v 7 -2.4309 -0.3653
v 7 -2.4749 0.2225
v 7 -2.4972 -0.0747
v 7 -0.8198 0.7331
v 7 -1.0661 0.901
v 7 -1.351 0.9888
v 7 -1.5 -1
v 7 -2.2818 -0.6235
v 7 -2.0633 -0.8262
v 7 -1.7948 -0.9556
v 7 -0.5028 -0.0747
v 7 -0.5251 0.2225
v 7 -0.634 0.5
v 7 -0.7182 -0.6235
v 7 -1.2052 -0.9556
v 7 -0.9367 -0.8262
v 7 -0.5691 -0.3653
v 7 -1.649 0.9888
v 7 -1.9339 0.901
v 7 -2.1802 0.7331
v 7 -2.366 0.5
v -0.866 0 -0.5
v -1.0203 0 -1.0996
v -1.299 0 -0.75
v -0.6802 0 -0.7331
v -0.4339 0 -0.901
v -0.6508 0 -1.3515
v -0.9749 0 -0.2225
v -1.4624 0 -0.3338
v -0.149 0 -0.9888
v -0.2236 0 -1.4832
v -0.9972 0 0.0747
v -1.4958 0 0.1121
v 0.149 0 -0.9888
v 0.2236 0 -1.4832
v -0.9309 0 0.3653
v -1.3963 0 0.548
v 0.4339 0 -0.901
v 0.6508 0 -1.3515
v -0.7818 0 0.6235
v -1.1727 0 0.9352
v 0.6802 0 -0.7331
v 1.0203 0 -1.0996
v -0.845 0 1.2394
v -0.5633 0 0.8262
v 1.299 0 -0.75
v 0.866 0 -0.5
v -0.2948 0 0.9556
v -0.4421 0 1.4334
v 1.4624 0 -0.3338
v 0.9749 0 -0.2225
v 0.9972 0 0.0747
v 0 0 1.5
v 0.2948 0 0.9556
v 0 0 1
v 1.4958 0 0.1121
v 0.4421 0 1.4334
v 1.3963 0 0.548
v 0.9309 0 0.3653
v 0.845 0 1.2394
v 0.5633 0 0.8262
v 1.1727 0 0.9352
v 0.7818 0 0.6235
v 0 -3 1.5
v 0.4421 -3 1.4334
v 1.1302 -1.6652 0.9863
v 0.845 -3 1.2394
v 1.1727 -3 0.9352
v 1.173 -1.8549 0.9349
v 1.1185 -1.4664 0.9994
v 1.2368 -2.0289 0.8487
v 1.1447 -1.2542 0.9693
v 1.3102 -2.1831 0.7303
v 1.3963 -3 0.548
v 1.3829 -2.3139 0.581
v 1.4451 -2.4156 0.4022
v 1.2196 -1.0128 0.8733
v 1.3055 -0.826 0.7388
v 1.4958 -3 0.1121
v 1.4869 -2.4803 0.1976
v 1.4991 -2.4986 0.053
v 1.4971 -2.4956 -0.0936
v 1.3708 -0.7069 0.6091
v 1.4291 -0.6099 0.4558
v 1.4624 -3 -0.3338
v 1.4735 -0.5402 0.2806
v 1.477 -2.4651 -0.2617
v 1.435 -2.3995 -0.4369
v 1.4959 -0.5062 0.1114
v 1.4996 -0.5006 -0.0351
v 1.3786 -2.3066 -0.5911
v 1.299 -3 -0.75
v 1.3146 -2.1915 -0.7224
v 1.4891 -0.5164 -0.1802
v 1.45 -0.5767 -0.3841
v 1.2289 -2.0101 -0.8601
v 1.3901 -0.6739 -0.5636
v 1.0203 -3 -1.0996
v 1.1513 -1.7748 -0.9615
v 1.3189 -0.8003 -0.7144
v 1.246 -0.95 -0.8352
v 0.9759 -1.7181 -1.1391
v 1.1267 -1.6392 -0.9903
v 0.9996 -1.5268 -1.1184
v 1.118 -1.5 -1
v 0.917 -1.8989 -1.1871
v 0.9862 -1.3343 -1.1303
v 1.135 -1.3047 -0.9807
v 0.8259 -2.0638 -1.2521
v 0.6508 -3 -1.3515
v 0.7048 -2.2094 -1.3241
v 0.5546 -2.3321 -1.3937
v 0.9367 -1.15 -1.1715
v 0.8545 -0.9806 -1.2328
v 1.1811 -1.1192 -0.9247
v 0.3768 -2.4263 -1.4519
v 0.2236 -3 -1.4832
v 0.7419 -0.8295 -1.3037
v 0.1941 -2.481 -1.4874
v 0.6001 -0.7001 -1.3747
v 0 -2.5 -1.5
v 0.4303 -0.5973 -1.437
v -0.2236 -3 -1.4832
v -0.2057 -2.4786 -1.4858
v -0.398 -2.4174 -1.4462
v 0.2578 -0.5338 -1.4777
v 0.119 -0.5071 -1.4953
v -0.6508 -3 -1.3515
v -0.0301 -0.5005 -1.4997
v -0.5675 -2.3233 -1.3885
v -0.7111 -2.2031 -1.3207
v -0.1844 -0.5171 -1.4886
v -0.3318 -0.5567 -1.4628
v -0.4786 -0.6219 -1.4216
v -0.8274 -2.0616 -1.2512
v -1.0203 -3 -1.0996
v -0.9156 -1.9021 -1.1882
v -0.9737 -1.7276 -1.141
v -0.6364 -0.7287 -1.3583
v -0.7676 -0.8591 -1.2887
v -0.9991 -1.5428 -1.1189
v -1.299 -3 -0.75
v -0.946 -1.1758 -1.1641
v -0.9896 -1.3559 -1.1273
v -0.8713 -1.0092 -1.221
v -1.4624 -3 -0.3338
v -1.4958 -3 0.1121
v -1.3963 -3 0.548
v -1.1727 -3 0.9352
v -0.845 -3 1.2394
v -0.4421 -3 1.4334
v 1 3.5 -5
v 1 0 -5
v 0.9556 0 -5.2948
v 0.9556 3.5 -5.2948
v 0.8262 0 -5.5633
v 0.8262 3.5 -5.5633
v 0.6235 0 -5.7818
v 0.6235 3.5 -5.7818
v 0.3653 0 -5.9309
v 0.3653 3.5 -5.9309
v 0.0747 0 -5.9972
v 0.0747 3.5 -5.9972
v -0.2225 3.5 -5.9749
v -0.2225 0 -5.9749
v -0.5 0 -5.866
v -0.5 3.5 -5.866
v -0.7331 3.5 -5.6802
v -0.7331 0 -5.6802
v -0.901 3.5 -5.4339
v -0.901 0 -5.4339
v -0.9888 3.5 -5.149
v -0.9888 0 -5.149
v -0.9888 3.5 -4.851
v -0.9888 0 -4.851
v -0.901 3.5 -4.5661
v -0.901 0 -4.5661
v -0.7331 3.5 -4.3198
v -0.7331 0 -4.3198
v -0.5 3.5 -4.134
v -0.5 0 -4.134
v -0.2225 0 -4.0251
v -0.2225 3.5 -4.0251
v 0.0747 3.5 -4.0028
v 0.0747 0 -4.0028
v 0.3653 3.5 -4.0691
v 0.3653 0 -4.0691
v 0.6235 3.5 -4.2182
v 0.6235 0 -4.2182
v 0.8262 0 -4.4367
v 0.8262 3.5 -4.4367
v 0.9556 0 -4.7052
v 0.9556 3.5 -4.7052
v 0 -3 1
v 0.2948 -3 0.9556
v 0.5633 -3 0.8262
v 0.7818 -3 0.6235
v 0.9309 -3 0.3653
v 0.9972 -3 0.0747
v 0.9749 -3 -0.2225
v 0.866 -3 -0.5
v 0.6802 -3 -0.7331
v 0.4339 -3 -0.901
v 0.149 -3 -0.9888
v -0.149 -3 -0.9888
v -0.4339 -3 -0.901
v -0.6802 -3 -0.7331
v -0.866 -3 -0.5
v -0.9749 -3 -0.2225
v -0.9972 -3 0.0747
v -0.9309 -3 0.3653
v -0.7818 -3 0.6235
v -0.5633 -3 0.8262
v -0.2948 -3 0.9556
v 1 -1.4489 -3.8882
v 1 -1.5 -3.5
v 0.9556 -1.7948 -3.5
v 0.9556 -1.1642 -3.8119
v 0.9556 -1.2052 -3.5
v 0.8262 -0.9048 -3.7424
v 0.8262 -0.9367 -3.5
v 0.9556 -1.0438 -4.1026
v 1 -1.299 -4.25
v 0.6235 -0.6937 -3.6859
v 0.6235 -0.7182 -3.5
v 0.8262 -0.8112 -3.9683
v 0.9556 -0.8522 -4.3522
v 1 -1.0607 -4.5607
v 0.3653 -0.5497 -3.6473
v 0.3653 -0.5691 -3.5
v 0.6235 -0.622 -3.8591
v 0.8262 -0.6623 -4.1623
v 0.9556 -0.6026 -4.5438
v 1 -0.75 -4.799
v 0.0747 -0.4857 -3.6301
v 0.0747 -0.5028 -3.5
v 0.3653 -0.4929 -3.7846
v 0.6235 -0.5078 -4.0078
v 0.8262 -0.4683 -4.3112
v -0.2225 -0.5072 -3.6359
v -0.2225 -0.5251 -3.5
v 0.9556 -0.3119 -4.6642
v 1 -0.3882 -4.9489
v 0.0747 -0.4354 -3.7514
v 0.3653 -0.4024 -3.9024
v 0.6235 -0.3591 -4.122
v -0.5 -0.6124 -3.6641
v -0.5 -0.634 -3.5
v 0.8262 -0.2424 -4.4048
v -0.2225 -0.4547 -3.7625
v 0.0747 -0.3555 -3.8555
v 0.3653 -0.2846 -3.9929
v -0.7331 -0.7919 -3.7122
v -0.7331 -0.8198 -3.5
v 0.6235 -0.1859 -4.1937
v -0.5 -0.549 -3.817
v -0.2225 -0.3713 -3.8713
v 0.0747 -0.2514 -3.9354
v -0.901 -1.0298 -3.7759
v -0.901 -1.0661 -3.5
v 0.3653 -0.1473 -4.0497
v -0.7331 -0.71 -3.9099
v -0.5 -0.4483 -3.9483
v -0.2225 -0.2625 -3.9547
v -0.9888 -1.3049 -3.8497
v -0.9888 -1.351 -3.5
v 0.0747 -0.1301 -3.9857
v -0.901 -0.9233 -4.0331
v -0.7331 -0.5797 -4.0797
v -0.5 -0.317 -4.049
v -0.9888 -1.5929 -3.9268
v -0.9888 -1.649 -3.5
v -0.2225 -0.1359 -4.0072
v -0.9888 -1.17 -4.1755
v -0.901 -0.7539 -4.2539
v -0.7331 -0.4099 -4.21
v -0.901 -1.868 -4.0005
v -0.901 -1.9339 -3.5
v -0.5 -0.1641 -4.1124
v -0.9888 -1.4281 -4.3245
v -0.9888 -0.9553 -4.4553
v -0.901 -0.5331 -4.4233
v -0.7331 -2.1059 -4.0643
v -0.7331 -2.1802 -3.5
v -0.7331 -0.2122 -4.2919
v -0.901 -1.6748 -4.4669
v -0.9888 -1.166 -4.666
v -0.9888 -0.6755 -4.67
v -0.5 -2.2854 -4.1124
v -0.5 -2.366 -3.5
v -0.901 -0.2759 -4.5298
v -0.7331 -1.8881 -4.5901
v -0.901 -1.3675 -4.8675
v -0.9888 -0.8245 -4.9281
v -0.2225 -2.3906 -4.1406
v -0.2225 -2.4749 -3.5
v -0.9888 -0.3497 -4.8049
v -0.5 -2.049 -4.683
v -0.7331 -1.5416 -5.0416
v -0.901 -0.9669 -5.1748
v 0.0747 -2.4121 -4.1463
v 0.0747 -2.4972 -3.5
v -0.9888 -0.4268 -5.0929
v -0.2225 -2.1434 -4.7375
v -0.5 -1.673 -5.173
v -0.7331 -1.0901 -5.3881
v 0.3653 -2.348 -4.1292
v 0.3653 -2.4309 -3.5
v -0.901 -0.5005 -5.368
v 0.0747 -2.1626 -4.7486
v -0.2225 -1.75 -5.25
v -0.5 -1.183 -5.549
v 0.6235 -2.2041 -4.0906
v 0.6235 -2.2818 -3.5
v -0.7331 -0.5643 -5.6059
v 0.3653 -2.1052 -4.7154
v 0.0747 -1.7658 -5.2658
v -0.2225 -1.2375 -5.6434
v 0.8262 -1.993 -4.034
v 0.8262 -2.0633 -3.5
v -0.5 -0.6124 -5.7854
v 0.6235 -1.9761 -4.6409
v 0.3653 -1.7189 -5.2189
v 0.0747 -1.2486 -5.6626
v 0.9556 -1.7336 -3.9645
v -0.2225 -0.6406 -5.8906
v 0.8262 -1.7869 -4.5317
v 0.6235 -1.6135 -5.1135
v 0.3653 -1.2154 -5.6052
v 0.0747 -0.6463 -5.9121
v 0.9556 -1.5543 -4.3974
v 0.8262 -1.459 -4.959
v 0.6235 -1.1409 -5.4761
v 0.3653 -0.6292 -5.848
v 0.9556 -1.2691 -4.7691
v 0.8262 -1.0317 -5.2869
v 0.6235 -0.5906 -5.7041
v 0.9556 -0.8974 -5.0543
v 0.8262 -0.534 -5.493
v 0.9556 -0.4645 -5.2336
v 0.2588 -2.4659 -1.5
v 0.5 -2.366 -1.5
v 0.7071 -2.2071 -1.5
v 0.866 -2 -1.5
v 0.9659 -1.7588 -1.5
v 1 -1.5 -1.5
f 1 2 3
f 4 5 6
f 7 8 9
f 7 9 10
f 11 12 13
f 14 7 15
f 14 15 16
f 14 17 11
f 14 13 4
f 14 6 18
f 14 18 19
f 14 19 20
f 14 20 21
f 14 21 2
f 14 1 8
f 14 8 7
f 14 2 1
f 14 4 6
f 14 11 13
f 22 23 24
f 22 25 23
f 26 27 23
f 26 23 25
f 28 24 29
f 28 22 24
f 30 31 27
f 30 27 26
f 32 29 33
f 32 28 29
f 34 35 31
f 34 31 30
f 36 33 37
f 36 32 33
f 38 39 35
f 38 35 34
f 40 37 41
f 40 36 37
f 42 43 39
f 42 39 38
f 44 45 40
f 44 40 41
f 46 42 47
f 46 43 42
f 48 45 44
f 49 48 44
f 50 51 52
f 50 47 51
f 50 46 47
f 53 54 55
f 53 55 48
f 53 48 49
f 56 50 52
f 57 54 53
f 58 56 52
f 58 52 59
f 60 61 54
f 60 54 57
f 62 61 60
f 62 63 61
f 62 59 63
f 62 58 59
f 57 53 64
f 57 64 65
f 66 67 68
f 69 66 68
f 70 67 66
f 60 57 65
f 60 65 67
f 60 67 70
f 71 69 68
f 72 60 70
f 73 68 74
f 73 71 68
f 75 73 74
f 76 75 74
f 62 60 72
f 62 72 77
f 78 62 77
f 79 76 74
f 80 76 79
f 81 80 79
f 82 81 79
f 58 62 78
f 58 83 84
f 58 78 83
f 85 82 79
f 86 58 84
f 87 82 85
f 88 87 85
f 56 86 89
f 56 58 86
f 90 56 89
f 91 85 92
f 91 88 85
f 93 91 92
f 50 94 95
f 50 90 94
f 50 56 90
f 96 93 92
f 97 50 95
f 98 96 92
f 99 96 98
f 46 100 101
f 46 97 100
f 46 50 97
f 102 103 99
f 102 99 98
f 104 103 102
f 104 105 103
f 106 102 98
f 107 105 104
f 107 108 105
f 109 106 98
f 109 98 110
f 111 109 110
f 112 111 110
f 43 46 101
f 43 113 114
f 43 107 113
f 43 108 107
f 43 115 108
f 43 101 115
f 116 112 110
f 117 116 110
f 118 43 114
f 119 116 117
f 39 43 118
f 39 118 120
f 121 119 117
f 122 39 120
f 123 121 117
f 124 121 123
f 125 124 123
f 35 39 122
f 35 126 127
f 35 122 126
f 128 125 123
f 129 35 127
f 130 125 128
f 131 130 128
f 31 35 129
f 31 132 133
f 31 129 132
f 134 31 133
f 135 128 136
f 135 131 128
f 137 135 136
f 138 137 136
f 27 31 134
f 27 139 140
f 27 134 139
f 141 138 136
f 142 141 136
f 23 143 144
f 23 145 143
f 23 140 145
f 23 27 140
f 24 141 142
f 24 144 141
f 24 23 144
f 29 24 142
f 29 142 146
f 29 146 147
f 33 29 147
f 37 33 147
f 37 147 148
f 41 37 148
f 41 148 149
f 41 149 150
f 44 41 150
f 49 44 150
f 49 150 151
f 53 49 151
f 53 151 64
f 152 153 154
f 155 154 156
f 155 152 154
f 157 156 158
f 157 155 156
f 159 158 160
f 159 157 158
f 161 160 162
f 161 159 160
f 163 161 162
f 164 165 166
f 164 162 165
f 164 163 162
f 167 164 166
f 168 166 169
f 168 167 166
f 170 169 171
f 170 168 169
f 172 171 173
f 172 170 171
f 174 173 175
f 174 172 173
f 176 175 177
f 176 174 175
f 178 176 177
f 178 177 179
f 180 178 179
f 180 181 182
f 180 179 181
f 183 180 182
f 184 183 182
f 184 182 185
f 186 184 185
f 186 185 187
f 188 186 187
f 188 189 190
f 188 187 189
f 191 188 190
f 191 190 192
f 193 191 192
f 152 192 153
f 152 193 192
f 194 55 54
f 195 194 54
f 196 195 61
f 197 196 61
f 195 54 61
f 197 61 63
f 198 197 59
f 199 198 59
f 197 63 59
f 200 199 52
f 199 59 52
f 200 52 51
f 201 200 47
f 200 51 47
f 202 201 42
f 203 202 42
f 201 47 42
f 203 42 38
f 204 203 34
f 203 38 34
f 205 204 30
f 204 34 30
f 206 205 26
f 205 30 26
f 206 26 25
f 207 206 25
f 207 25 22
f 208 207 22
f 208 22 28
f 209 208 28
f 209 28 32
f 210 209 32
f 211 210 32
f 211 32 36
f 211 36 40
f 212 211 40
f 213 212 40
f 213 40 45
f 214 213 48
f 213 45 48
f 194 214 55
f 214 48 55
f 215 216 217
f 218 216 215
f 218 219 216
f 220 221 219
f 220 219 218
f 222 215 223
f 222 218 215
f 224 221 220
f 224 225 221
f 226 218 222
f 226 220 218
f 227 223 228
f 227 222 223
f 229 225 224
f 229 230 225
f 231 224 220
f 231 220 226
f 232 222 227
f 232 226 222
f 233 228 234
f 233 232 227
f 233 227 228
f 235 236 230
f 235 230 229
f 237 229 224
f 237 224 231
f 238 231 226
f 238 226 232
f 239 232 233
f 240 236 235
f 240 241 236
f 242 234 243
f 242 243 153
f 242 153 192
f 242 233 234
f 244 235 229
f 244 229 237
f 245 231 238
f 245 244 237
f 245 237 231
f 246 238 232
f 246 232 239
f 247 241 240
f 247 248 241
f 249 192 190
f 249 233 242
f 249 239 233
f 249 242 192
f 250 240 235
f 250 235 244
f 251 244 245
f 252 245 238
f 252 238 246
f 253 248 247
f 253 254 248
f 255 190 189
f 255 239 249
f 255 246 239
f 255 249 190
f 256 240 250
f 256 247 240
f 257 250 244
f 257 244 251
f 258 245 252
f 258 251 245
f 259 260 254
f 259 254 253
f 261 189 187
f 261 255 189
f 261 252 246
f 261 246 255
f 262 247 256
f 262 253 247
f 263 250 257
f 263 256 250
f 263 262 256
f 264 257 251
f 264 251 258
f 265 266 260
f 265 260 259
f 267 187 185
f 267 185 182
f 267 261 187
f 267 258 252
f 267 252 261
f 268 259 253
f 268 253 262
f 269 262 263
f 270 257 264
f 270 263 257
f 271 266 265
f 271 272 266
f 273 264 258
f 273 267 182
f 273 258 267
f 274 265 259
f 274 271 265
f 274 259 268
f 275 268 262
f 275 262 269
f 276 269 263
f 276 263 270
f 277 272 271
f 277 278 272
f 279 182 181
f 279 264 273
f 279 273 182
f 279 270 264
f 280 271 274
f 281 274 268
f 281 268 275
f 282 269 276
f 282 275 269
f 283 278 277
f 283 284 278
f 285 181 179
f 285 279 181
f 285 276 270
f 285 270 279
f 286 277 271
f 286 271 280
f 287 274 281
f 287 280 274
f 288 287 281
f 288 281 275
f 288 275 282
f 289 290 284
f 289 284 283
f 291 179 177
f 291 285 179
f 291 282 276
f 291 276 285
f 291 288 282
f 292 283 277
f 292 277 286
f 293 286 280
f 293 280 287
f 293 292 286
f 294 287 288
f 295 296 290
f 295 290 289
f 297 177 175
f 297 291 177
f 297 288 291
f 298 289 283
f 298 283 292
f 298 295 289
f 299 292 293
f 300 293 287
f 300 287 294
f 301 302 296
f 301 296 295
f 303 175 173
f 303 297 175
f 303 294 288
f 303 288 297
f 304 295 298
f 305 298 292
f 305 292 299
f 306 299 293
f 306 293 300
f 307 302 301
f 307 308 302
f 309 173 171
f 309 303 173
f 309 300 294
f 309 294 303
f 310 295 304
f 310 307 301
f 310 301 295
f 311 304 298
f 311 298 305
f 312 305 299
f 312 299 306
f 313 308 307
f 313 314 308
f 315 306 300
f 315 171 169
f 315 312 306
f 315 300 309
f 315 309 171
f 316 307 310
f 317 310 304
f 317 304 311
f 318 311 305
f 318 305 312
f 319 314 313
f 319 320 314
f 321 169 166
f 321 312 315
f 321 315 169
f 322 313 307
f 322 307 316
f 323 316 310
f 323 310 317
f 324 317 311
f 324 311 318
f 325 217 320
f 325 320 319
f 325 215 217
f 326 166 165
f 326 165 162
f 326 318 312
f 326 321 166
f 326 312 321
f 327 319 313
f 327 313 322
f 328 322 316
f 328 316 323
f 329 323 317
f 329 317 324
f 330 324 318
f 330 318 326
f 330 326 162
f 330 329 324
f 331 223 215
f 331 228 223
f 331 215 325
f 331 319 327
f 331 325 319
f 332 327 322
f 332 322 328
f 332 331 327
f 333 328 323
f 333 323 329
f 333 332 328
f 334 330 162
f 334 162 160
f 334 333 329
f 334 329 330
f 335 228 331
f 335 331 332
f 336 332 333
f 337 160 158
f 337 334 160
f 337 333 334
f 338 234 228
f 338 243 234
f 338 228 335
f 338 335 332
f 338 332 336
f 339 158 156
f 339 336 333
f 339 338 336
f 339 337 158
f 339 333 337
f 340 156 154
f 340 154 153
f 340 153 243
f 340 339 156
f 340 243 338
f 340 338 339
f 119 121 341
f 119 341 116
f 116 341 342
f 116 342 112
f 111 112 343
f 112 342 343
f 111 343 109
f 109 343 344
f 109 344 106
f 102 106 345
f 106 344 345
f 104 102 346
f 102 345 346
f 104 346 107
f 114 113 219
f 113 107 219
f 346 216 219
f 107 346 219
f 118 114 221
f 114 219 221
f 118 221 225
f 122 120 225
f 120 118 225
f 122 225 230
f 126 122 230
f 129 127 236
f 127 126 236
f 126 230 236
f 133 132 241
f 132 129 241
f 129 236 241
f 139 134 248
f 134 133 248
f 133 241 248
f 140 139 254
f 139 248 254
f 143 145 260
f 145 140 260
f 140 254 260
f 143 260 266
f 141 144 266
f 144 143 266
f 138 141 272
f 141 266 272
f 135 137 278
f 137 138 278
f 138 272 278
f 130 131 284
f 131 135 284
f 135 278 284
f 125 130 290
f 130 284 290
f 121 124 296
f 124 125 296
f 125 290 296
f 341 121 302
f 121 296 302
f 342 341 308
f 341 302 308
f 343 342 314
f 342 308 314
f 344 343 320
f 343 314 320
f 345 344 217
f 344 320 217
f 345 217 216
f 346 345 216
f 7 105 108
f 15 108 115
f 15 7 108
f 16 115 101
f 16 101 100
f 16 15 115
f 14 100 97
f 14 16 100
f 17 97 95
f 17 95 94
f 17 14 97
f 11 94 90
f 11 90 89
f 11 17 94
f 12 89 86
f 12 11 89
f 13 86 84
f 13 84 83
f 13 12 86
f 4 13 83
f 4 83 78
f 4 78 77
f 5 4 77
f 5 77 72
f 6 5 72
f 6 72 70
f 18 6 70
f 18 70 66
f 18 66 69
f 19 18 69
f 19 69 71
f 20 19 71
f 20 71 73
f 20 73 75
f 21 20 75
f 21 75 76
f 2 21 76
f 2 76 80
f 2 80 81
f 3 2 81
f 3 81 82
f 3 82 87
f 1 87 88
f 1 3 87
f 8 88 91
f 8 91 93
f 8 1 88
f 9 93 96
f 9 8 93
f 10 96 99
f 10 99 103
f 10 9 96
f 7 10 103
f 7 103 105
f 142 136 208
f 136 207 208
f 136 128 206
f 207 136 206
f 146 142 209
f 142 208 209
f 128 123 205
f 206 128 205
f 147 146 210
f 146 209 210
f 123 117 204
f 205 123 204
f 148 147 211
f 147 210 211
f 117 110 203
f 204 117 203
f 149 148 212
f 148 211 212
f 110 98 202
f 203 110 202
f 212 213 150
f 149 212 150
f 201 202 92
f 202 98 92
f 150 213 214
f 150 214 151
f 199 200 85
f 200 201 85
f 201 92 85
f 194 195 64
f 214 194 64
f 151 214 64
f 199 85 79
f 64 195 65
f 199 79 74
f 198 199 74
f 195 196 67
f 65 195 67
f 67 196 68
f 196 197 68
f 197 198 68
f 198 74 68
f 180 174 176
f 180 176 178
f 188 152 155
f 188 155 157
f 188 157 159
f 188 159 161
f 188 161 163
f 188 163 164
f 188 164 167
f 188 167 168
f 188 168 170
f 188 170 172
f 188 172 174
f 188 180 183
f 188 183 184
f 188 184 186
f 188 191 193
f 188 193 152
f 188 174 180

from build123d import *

# Parameters (mm, degrees)
SKETCH1_R                = 1.5
SKETCH1_R_2              = 1
BOSS_EXTRUDE1_DEPTH      = 3
SKETCH3_R                = 1
BOSS_EXTRUDE4_REACH      = 7.895
SKETCH4_R                = 1
BOSS_EXTRUDE5_REACH      = 12.977
BOSS_EXTRUDE5_END_RADIUS = 1.5
SKETCH6_R                = 1


with BuildPart() as part:
    # Sketch1 → Boss-Extrude1 (new body)
    with BuildSketch(Plane(origin=(0, 0, 0), x_dir=(1, 0, 0), z_dir=(0, 1, 0))):
        with Locations(Location((0, 0, 0), (0, 0, 270))):
            Circle(SKETCH1_R)
        with Locations(Location((0, 0, 0), (0, 0, 270))):
            Circle(SKETCH1_R_2, mode=Mode.SUBTRACT)
    extrude(amount=-BOSS_EXTRUDE1_DEPTH)

    # Sketch4 → Boss-Extrude4 (add, up to next)
    with BuildSketch(Plane.XY.offset(-1.5), mode=Mode.PRIVATE) as boss_extrude4_sk1:
        with Locations(Location((0, -1.5, 0), (0, 0, 180))):
            Circle(SKETCH4_R)
    boss_extrude4_tool1 = extrude(boss_extrude4_sk1.sketch, amount=BOSS_EXTRUDE4_REACH, mode=Mode.PRIVATE) - part.part


with BuildPart() as body_2:
    # Sweep1: sweep along a path in Sketch2
    with BuildLine(Plane(origin=(0, 0, 0), x_dir=(0, 0, -1), z_dir=(1, 0, 0))) as sweep1_path:
        Line((1.5, -1.5), (3.5, -1.5))
        ThreePointArc((3.5, -1.5), (4.560660172, -1.060660172), (5, 0))
        Line((5, 0), (5, 3.5))
    # Sketch3 → Sweep1 (sweep)
    with BuildSketch(Plane(origin=(0, 3.5, 0), x_dir=(1, 0, 0), z_dir=(0, 1, 0))):
        with Locations((0, 5)):
            Circle(SKETCH3_R)
    sweep(path=sweep1_path.line)


with BuildPart() as part_1:
    add(part.part)

    add(body_2.part)  # Boss-Extrude4 merges body 2
    add(boss_extrude4_tool1.solids().sort_by_distance((0, -1.5, -1.5))[0])
    add(boss_extrude4_tool1.solids().sort_by_distance((0, -1.5, -1.5))[1])

    # Boss-Extrude5: up to this cylinder (the profile starts outside it)
    boss_extrude5_end = Plane(origin=(0, -1.5, 0), z_dir=(0, 1, 0)) * Cylinder(BOSS_EXTRUDE5_END_RADIUS, 29.954, mode=Mode.PRIVATE)
    # Sketch6 → Boss-Extrude5 (add, up to the surface)
    with BuildSketch(Plane(origin=(7, 0, 0), x_dir=(0, 0, -1), z_dir=(1, 0, 0)), mode=Mode.PRIVATE) as boss_extrude5_sk1:
        with Locations((0, -1.5)):
            Circle(SKETCH6_R)
    boss_extrude5_tool1 = extrude(boss_extrude5_sk1.sketch, amount=-BOSS_EXTRUDE5_REACH, mode=Mode.PRIVATE) - boss_extrude5_end
    add(boss_extrude5_tool1.solids().sort_by_distance((7, -1.5, 0))[0])


solid = part_1.part
